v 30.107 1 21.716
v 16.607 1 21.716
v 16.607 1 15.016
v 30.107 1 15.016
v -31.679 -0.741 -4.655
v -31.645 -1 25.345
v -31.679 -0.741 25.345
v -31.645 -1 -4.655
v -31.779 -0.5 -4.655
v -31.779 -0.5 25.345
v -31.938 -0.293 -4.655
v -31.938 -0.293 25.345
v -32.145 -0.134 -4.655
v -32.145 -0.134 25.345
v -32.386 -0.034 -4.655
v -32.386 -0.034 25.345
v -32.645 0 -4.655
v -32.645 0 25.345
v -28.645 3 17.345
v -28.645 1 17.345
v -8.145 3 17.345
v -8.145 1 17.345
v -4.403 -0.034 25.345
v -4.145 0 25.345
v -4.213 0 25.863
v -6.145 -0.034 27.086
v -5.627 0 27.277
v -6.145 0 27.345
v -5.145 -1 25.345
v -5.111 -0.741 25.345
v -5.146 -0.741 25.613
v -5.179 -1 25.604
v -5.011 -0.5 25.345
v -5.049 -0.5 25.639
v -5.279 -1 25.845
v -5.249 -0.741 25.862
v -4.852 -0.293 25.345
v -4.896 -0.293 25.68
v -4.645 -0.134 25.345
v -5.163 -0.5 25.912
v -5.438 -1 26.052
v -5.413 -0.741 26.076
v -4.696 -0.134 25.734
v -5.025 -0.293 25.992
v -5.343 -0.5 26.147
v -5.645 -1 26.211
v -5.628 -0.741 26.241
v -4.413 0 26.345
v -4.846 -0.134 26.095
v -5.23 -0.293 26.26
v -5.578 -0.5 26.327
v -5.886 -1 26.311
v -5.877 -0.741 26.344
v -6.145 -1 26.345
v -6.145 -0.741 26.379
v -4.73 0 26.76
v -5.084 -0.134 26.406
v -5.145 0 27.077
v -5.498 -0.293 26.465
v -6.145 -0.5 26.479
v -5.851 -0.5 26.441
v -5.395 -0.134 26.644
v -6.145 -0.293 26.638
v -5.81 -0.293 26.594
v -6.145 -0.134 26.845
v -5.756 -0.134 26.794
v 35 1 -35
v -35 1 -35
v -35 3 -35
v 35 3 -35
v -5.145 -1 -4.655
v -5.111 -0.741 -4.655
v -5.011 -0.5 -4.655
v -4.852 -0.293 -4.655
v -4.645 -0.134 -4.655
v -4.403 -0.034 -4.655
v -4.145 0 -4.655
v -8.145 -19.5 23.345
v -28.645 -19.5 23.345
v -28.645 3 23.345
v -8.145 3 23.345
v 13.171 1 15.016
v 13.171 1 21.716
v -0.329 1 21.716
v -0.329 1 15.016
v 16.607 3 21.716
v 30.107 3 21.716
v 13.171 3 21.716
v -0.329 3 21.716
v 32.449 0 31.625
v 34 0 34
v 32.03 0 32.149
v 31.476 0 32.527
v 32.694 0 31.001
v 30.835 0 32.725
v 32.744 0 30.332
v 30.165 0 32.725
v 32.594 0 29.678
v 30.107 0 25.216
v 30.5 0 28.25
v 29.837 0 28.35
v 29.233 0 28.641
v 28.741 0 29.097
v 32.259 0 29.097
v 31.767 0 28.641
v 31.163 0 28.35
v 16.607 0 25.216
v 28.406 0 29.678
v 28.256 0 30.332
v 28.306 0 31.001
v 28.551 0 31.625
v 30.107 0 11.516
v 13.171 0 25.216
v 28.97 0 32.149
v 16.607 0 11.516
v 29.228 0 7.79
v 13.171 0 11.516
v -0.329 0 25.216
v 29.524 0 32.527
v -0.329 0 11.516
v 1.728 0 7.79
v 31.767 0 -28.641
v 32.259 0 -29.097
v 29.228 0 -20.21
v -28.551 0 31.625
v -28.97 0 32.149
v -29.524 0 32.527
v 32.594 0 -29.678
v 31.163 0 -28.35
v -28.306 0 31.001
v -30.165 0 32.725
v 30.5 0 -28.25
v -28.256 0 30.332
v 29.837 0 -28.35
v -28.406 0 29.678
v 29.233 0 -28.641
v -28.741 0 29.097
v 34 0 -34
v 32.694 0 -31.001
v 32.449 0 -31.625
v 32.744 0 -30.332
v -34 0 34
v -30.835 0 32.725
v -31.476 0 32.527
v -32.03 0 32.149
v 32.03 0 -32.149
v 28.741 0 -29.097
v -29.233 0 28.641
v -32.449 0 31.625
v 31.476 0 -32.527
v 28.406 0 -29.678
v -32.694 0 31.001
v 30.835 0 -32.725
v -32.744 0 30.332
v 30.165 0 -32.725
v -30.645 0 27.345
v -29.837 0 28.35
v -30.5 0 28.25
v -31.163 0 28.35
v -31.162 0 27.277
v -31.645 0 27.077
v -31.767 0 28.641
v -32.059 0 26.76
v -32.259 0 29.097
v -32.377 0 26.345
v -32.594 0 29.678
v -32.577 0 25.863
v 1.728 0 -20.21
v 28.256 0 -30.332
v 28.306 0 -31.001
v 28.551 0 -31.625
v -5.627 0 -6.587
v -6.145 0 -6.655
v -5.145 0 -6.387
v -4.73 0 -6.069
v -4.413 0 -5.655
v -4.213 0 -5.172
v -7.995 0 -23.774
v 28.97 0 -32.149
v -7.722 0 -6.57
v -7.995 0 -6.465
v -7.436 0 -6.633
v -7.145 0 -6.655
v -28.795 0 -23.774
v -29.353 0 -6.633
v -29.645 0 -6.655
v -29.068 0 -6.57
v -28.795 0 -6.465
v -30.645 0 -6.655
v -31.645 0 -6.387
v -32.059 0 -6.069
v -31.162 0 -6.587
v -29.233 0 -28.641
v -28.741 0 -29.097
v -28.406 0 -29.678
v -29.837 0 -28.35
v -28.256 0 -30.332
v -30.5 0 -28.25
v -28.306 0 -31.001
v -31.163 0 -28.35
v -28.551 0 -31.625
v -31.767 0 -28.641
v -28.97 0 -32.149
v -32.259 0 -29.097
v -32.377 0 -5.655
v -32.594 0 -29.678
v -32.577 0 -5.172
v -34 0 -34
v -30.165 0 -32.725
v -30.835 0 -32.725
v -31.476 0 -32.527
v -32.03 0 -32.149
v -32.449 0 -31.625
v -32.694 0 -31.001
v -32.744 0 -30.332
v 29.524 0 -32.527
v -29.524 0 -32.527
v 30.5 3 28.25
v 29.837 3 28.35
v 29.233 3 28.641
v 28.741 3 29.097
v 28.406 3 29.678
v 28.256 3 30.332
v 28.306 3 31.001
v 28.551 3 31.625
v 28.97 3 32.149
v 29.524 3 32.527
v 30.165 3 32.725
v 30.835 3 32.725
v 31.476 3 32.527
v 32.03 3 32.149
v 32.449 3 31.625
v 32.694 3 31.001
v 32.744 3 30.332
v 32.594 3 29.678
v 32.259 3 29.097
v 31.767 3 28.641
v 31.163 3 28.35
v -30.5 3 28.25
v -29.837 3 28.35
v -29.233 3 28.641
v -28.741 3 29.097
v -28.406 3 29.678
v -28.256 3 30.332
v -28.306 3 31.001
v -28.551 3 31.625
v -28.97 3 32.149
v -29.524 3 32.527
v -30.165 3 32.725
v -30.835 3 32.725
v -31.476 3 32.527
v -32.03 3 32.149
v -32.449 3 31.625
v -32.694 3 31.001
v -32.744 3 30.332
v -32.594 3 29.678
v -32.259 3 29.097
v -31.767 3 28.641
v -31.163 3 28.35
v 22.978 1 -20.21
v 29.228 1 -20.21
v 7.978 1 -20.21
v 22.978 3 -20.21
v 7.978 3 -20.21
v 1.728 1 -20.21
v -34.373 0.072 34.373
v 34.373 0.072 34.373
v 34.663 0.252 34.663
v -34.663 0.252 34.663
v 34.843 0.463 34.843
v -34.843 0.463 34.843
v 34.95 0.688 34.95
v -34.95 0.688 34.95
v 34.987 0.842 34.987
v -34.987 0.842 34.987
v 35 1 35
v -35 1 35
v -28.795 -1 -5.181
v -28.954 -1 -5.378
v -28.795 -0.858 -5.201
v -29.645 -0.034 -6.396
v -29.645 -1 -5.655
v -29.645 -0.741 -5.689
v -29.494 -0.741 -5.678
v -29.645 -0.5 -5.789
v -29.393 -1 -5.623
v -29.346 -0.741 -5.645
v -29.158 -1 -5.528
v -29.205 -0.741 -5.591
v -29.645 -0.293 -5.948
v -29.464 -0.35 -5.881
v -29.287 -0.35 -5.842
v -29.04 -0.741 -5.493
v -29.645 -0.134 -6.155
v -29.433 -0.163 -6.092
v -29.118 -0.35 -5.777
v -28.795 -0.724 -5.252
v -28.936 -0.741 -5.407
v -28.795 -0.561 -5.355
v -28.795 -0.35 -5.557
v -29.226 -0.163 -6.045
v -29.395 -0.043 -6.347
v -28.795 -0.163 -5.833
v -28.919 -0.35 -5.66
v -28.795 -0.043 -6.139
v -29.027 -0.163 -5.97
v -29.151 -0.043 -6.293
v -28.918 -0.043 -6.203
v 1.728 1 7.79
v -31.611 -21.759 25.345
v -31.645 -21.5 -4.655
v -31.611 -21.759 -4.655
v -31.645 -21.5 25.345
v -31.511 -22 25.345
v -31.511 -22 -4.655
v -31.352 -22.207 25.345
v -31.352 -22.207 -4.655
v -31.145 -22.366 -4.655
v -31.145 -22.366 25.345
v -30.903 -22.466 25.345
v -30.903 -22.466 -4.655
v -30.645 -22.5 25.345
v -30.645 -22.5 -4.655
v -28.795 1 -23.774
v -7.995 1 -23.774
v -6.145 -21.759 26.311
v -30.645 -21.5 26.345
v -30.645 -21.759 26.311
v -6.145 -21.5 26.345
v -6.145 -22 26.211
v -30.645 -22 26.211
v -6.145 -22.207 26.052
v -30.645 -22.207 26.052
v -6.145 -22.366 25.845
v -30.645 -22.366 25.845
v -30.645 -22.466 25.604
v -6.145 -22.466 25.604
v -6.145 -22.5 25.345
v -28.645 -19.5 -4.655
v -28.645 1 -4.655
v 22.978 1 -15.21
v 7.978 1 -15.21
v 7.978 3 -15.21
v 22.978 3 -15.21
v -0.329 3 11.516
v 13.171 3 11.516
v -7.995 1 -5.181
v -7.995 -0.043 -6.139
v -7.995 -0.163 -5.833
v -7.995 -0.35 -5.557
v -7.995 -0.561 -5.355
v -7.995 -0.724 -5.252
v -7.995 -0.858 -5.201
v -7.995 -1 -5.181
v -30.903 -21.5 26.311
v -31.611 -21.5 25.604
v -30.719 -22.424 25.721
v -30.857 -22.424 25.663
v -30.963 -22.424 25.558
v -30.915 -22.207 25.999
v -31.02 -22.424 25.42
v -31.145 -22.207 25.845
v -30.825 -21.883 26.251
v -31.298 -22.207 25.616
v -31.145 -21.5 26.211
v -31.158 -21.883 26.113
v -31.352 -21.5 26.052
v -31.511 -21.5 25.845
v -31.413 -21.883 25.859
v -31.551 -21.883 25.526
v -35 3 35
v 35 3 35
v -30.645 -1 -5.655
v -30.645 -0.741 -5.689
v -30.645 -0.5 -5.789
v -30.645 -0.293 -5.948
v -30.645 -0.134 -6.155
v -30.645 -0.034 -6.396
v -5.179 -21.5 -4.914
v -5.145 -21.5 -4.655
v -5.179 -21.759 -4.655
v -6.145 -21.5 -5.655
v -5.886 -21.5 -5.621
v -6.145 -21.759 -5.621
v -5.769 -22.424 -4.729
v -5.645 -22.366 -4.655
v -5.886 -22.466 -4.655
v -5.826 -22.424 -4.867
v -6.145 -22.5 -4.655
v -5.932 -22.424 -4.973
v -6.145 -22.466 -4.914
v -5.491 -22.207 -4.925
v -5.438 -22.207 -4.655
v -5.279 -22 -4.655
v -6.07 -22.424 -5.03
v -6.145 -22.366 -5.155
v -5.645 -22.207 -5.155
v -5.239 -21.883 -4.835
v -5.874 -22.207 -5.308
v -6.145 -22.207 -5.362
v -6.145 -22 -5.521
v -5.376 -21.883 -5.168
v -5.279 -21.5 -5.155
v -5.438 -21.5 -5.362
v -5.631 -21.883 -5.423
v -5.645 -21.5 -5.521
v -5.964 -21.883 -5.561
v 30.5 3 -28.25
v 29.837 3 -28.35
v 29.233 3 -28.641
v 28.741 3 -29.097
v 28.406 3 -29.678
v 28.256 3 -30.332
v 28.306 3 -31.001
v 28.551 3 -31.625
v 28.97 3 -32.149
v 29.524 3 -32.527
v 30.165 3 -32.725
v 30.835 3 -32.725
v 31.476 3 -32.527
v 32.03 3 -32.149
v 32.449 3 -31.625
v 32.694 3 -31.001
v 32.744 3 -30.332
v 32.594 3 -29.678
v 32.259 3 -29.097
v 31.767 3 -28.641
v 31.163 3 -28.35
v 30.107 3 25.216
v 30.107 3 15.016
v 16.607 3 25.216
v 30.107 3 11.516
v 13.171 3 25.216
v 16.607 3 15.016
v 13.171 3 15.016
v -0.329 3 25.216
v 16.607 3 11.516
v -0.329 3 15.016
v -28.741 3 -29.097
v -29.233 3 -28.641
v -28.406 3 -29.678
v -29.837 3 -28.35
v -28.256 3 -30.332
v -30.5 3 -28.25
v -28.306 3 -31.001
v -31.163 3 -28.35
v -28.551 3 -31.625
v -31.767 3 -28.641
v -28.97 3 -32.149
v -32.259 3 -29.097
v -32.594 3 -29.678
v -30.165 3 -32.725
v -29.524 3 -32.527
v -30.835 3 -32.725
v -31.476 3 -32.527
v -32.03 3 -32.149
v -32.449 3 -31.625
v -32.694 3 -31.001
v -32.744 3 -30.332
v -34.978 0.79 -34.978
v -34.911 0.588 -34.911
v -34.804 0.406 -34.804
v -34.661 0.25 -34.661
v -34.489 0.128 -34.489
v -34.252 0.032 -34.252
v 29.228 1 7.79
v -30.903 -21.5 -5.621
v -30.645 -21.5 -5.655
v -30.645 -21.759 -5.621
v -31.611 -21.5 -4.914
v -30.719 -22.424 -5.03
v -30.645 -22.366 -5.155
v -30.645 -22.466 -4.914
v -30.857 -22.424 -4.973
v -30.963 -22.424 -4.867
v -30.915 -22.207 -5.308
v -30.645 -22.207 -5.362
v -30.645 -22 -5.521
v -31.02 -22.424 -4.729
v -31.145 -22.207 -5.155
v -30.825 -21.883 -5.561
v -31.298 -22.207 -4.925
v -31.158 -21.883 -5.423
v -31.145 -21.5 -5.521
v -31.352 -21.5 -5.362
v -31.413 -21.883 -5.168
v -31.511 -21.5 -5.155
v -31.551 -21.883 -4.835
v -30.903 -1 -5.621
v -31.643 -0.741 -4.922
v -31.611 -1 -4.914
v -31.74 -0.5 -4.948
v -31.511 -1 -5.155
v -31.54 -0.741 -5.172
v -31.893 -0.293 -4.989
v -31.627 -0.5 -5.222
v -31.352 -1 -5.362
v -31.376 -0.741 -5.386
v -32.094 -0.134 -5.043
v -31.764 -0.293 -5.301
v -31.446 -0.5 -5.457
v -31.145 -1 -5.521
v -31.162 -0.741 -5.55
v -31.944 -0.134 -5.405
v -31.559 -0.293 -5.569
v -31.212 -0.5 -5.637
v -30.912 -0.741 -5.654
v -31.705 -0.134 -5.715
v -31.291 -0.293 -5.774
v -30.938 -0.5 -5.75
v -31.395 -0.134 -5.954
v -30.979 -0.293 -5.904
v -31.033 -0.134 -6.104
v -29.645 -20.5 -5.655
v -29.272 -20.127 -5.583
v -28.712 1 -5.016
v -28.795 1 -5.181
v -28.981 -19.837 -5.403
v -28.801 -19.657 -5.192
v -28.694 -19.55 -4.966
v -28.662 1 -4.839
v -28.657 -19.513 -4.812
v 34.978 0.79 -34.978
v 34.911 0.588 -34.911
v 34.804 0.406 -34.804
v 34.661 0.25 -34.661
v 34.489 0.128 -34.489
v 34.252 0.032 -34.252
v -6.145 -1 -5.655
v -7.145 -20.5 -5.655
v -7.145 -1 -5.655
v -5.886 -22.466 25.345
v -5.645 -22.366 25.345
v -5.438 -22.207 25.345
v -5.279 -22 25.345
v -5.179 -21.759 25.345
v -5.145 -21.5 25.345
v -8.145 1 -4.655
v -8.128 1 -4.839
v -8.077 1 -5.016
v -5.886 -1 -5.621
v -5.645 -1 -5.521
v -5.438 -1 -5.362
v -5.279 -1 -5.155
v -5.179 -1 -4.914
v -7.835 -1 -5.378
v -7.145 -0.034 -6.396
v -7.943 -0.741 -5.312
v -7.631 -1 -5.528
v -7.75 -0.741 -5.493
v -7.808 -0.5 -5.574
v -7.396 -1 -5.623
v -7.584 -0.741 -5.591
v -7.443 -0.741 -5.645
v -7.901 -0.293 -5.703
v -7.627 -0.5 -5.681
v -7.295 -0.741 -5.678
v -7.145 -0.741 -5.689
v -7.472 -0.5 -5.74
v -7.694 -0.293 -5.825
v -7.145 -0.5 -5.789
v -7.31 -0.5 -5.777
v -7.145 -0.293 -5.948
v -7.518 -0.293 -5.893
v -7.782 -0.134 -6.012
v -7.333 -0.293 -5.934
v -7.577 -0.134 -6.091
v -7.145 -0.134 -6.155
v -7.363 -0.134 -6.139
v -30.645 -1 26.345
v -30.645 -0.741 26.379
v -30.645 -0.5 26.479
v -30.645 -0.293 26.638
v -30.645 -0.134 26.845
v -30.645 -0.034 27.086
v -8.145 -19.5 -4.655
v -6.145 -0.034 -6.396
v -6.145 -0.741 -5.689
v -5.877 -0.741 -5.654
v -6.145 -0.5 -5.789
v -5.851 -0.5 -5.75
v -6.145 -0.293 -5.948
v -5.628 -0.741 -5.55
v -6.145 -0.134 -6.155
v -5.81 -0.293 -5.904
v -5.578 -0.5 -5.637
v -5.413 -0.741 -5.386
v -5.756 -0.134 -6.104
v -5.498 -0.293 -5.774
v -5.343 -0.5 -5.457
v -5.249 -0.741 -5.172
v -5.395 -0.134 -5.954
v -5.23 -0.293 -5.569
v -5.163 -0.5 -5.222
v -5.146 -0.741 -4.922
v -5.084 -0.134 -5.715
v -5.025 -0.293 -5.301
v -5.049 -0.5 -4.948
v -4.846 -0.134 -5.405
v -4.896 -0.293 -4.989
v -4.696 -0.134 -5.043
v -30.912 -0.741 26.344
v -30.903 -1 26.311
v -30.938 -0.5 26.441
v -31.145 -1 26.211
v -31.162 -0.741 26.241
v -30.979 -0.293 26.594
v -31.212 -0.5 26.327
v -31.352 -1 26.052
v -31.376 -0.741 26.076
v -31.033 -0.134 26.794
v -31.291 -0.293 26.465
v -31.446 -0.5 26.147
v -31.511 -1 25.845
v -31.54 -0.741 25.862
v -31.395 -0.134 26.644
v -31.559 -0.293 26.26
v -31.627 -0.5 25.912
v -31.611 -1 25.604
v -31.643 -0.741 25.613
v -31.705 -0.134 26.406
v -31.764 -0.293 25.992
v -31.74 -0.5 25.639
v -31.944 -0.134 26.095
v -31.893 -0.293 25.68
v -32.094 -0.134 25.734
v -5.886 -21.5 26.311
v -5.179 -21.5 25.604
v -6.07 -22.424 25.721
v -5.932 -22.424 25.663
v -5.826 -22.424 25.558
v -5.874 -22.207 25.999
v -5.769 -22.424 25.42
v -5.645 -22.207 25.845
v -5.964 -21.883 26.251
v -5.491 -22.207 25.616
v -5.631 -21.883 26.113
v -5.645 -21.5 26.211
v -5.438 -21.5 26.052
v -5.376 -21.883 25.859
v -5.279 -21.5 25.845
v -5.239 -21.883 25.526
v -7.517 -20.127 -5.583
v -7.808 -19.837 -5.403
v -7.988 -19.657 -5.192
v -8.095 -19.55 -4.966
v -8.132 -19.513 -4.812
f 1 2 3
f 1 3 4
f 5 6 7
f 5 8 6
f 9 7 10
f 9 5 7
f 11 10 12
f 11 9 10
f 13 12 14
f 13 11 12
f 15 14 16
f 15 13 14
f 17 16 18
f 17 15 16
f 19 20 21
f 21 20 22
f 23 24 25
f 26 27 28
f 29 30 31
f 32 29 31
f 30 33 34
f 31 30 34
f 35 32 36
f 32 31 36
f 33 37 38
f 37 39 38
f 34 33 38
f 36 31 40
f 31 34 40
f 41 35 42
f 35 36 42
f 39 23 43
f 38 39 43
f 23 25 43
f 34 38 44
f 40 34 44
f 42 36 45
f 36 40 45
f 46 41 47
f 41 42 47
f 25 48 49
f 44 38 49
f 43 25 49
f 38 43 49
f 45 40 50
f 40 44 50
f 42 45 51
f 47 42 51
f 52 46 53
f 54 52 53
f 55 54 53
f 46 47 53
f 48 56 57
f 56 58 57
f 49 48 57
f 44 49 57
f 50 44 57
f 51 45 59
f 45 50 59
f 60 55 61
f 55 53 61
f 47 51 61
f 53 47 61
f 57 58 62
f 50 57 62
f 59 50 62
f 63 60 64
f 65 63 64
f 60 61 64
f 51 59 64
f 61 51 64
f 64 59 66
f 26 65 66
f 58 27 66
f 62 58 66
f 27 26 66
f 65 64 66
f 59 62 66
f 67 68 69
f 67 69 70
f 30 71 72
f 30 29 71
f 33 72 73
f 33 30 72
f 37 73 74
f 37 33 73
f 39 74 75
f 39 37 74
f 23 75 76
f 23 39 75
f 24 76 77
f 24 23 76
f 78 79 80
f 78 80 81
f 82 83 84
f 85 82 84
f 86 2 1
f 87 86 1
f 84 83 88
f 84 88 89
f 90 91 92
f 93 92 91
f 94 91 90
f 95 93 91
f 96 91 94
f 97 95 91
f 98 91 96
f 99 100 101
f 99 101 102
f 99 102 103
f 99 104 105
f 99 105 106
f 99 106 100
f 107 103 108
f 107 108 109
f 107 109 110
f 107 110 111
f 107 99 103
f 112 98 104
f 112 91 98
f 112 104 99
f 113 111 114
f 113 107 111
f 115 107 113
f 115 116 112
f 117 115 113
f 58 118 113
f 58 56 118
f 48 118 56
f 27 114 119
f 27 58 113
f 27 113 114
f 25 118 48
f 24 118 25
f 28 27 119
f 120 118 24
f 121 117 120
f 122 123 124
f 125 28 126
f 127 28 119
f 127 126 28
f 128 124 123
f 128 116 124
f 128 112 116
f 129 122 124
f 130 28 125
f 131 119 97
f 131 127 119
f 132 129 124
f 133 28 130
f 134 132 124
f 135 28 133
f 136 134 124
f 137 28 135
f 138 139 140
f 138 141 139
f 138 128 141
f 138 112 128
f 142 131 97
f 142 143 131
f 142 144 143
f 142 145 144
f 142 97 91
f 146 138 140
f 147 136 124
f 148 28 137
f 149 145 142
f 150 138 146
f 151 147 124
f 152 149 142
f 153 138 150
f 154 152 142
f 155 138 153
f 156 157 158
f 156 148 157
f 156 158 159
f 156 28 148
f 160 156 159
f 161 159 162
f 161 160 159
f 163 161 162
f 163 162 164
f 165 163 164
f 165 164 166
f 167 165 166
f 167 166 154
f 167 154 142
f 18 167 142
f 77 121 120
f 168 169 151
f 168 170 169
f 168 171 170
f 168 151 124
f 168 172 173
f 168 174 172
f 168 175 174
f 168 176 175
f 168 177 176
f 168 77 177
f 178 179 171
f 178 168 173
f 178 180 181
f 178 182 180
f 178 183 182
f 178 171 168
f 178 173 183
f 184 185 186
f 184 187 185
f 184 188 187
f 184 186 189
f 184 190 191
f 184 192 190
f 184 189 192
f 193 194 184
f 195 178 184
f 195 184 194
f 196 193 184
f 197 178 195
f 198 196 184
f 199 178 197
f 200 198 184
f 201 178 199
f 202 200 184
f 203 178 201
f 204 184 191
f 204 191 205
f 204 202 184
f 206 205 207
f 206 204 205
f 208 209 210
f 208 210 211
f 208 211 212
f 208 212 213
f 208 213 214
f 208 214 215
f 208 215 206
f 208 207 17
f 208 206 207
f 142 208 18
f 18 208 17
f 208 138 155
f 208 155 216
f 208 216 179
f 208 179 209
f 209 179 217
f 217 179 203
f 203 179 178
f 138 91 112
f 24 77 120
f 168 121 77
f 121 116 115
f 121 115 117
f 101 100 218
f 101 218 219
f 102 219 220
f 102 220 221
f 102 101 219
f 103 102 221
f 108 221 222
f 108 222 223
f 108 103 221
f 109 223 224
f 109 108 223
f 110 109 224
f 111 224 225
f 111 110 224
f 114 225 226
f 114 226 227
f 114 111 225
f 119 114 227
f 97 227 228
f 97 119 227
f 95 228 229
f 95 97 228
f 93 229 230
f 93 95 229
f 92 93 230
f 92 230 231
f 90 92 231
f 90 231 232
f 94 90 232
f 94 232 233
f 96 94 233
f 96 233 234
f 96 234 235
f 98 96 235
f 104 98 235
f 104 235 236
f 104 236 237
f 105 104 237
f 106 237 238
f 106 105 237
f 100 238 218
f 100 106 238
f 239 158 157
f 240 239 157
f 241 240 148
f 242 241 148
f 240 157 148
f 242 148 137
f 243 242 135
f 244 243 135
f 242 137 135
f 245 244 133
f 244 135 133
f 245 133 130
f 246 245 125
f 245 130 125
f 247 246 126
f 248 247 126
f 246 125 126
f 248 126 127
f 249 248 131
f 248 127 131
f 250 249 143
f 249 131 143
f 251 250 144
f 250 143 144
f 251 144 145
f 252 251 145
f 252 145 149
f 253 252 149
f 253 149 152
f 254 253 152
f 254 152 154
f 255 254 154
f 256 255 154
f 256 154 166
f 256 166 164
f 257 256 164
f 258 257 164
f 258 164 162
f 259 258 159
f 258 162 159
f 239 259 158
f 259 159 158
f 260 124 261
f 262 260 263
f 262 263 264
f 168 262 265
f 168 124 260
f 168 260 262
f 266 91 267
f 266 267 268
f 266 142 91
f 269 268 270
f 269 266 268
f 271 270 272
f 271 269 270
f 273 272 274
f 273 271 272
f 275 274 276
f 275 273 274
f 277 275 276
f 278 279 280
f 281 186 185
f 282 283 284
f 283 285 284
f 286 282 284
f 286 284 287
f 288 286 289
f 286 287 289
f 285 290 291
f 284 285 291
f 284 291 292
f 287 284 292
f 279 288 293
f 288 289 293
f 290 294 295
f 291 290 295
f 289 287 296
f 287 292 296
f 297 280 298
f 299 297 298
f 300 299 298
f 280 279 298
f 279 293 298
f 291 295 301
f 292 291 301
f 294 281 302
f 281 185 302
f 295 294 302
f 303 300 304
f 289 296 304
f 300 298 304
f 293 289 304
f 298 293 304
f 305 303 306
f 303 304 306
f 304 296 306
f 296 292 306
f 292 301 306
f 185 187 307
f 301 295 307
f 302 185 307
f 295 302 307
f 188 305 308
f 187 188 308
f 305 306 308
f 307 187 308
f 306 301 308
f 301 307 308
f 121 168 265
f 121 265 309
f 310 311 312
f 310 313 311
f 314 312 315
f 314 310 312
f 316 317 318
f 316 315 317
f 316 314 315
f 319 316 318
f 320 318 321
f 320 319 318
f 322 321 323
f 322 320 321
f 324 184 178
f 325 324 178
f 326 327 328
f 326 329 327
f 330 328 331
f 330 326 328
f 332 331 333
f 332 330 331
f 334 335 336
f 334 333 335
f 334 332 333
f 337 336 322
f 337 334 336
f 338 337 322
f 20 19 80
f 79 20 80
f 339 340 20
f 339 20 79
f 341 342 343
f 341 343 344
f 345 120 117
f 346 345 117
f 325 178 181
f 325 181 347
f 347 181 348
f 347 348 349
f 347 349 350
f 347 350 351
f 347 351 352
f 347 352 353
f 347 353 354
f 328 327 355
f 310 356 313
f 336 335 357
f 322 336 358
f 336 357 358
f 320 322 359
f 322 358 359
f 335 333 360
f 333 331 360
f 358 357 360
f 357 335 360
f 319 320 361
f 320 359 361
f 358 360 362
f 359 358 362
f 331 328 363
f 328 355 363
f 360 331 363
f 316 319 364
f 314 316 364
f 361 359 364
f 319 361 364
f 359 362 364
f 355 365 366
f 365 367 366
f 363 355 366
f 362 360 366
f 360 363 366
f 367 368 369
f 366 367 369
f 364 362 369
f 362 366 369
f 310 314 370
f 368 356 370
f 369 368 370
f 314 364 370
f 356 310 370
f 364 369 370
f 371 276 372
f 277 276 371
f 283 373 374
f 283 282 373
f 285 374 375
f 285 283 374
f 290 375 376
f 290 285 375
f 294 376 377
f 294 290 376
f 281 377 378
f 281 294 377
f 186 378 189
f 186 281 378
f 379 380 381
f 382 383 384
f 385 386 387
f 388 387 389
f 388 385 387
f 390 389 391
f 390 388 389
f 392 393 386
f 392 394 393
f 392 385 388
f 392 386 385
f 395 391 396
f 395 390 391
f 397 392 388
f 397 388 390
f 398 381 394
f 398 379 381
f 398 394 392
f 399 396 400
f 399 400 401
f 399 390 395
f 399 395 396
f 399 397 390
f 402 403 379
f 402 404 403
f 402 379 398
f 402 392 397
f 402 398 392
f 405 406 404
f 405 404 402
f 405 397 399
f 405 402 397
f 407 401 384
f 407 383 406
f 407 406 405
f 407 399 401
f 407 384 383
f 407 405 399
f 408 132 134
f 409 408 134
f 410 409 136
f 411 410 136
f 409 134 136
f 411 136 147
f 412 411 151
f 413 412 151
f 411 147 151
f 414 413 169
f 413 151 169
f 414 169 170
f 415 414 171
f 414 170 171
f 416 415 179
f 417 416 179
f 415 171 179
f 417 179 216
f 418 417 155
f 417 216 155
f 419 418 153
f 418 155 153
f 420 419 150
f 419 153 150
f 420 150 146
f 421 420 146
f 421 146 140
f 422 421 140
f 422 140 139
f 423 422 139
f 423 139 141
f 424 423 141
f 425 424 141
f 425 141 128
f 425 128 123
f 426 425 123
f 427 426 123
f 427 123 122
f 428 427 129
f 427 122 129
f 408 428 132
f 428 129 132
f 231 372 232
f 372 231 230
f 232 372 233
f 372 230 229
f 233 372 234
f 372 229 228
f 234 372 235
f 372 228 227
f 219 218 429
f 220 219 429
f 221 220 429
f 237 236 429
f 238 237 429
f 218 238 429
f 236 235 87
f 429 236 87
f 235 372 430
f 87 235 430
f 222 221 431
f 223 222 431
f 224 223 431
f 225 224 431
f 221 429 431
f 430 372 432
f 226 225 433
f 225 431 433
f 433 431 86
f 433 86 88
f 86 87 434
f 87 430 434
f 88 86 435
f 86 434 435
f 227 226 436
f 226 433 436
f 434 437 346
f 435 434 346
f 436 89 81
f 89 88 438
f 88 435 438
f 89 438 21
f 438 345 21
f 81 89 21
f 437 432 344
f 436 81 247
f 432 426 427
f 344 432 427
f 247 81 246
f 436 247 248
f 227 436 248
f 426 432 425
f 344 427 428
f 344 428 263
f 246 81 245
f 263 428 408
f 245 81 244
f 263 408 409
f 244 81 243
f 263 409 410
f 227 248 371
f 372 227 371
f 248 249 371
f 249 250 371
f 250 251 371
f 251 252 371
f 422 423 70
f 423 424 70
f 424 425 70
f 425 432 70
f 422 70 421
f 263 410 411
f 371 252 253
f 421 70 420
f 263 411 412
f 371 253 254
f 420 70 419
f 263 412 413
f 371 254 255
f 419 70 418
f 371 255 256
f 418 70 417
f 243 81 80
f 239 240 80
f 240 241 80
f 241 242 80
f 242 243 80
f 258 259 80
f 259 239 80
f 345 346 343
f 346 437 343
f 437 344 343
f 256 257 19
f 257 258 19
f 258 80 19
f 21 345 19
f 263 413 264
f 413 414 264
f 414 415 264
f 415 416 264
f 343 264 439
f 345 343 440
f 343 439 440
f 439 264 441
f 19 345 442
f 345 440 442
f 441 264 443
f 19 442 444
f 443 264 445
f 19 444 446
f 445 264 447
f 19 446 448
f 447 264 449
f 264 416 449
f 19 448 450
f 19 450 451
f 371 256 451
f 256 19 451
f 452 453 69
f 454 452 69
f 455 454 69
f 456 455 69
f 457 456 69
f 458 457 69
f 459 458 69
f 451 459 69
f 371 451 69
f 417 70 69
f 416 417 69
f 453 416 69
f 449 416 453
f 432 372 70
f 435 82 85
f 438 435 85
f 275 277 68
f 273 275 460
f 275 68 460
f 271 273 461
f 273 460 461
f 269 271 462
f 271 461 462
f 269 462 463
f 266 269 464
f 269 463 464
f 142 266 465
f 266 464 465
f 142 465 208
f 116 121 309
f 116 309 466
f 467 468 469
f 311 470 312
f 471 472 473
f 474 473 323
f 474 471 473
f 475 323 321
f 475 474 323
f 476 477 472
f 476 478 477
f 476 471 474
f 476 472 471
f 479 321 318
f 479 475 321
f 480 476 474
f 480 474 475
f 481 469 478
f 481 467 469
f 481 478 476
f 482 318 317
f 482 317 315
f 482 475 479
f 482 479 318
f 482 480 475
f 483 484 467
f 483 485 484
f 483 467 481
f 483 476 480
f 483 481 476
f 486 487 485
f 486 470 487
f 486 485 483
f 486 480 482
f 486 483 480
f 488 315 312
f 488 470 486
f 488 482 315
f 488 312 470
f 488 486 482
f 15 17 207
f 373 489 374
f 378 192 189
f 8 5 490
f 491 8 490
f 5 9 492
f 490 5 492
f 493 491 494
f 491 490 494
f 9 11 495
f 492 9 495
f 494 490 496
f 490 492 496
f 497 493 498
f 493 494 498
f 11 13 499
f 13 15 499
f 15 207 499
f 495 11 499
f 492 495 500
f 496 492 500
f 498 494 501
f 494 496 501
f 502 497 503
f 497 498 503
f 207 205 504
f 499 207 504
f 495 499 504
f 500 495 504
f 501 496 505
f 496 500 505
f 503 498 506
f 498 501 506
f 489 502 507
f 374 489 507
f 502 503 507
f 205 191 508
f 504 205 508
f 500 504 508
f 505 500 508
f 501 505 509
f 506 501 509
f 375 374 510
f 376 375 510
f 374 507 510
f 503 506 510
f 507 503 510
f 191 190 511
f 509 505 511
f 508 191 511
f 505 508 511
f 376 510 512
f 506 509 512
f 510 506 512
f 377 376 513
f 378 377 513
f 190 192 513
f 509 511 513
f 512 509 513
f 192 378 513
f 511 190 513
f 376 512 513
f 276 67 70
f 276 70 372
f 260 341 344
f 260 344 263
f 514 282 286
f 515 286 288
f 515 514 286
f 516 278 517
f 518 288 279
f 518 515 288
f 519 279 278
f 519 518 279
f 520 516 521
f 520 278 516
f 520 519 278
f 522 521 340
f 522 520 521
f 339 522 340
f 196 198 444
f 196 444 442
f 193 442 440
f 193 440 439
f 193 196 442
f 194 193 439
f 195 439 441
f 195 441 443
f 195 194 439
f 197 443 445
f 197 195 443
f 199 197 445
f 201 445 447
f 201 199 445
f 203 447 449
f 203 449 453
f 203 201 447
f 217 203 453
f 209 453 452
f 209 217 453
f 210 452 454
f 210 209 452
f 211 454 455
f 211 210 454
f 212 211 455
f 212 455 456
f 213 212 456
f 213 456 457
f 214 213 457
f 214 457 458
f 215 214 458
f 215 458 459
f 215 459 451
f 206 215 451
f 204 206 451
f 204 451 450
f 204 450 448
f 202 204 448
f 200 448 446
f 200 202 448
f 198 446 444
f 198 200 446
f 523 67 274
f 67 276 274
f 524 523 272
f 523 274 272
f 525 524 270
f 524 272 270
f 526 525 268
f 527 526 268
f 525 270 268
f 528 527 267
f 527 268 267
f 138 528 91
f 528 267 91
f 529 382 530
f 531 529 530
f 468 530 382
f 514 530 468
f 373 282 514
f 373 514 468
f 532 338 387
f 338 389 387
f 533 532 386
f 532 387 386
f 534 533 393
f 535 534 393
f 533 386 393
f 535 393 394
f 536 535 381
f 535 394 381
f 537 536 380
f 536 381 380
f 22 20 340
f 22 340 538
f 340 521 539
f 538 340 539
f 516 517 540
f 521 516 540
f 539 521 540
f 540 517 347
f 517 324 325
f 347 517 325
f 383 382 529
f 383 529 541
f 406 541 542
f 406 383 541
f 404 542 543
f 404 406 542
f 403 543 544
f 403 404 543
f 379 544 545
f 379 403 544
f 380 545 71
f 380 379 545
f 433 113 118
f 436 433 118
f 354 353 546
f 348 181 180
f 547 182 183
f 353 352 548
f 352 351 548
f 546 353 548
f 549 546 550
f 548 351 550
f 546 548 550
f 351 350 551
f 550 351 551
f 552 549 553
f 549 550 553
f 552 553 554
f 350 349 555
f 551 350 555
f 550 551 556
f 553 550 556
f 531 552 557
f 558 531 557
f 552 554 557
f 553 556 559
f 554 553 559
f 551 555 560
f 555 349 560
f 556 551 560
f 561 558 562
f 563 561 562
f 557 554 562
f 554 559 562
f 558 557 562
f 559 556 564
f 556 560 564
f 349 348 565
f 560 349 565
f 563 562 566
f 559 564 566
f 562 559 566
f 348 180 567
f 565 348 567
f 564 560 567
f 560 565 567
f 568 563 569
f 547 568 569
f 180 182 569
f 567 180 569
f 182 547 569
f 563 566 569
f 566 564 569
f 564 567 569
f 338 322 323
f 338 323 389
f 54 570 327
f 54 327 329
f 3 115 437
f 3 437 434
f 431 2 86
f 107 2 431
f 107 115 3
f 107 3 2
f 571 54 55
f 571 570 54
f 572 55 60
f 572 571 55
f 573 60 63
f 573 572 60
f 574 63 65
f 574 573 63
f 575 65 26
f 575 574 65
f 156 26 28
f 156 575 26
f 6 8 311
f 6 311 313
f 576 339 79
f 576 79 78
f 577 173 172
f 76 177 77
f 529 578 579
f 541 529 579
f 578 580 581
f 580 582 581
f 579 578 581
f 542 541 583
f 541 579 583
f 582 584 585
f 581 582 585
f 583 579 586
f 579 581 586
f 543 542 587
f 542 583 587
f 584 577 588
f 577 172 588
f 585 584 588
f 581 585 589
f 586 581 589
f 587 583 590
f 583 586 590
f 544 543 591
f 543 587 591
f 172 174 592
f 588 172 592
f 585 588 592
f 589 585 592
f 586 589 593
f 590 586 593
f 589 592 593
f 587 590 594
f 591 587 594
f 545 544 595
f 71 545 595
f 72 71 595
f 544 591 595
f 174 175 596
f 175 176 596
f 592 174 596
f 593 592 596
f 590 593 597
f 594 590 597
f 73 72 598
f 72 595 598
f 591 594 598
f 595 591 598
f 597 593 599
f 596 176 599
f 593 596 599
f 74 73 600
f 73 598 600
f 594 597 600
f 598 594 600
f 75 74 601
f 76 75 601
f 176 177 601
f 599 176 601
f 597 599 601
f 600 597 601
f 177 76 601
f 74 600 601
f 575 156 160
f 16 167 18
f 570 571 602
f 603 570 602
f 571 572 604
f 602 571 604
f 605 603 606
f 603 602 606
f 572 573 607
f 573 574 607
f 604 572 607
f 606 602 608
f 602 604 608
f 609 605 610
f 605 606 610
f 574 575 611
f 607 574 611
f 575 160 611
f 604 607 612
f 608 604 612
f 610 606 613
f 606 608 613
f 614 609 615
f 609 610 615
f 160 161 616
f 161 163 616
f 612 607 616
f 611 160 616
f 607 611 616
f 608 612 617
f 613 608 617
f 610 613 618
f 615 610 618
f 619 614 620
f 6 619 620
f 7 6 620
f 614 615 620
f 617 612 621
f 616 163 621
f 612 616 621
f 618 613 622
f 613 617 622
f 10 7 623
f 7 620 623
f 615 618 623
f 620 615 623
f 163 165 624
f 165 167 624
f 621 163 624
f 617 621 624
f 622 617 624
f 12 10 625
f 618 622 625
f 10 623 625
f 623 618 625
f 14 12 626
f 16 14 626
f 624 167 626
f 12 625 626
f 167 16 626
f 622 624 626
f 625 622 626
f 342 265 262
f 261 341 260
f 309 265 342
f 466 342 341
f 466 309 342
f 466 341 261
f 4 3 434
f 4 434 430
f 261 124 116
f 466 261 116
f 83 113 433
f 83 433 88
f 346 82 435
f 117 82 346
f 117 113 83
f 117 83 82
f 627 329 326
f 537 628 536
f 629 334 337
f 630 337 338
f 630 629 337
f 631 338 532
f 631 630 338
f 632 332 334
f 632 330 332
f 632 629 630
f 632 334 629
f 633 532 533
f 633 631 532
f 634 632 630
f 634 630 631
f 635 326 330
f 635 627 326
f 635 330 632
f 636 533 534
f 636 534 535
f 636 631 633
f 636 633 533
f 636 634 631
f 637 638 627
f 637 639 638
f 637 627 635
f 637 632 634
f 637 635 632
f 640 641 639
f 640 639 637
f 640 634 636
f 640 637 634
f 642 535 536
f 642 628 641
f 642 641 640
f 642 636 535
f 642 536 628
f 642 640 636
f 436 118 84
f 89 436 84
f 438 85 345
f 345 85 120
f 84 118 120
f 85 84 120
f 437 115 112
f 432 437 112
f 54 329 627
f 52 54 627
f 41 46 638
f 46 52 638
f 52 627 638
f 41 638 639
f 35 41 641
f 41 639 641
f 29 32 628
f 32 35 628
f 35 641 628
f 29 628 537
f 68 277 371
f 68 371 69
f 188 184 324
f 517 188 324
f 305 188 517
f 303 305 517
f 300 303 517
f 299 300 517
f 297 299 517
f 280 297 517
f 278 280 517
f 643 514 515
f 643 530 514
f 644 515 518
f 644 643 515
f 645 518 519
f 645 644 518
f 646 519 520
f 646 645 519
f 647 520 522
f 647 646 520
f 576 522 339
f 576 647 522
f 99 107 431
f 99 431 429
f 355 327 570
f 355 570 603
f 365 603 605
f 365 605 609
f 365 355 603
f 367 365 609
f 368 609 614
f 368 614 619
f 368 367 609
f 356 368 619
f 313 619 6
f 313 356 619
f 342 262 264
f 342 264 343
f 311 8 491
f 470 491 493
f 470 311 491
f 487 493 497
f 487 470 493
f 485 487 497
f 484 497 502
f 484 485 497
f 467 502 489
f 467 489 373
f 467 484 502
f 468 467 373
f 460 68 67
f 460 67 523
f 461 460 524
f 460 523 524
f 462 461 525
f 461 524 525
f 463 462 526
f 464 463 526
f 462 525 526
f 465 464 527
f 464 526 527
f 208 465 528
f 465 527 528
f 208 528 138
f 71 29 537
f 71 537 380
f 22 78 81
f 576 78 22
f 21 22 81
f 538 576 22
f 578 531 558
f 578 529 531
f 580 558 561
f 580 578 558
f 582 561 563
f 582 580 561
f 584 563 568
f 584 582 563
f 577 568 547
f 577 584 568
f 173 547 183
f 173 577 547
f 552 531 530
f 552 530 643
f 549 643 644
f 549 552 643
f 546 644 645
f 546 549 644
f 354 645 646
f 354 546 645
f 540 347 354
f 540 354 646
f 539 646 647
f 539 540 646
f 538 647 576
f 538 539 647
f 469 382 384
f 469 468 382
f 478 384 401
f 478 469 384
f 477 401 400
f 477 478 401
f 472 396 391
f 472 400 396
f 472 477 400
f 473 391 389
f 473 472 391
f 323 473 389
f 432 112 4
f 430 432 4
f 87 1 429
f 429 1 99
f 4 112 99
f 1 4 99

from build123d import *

# Parameters (mm, degrees)
BOSS_EXTRUDE1_DEPTH                        = 3
SKETCH4_R                                  = 2.250000000000006
CUT_EXTRUDE2_DEPTH                         = 3
MIRROR1_AT_THE_SECOND_PLANE_COPY_1_SKETC_R = 2.250000000000006
MIRROR1_AT_THE_SECOND_PLANE_COPY_1_DEPTH   = 3
FILLET4_R                                  = 1
CUT_EXTRUDE3_DEPTH                         = 1
SKETCH6_W                                  = 27.499999999999993
SKETCH6_H                                  = 27.999999999999996
CUT_EXTRUDE4_DEPTH                         = 1
CUT_EXTRUDE5_DEPTH                         = 3
SKETCH8_W                                  = 13.499999999999996
SKETCH8_H                                  = 13.700000000000003
CUT_EXTRUDE6_DEPTH                         = 1
SKETCH9_W                                  = 13.5
SKETCH9_H                                  = 3.5000000000000036
CUT_EXTRUDE7_DEPTH                         = 3
SKETCH10_W                                 = 13.499999999999996
SKETCH10_H                                 = 3.5000000000000036
SKETCH10_H_2                               = 3.5000000000000018
CUT_EXTRUDE8_DEPTH                         = 3
BOSS_EXTRUDE2_DEPTH                        = 23.5
CUT_EXTRUDE9_DEPTH                         = 29
SKETCH13_W                                 = 20.500000000000004
SKETCH13_H                                 = 6.0000000000000036
CUT_EXTRUDE10_DEPTH                        = 3
FILLET5_R                                  = 1
FILLET6_R                                  = 1
SKETCH14_W                                 = 20.8
SKETCH14_H                                 = 3.0000000000000036
CUT_EXTRUDE11_DEPTH                        = 1


with BuildPart() as part:
    # Sketch1 → Boss-Extrude1 (new body)
    with BuildSketch(Plane(origin=(0, 0, 0), x_dir=(1, 0, 0), z_dir=(0, 1, 0))):
        Polygon((-35, 35.00000000000001), (35, 35.00000000000001), (35.000000000000014, -34.99999999999999), (-35, -34.99999999999999), align=None)
    extrude(amount=BOSS_EXTRUDE1_DEPTH)

    # Sketch4 → Cut-Extrude2 (cut)
    with BuildSketch(Plane(origin=(0, 0, 0), x_dir=(-1, 0, 0), z_dir=(0, -1, 0))):
        with Locations(Location((30.500000000000004, -30.499999999999993, 0), (0, 0, 90))):
            Circle(SKETCH4_R)
    cut_extrude2 = extrude(amount=-CUT_EXTRUDE2_DEPTH, mode=Mode.SUBTRACT)

    # Mirror1: Cut-Extrude2 across plane
    add(cut_extrude2.mirror(Plane(origin=(0, 0, 0), x_dir=(0, 0, 1), z_dir=(1, 0, 0))), mode=Mode.SUBTRACT)

    # Mirror1 at the second plane: Cut-Extrude2 across plane
    add(cut_extrude2.mirror(Plane.XY), mode=Mode.SUBTRACT)

    # Mirror1 at the second plane copy 1 sketc → Mirror1 at the second plane copy 1 (cut)
    with BuildSketch(Plane.XZ):
        with Locations(Location((30.500000000000004, -30.499999999999993, 0), (0, 0, 90))):
            Circle(MIRROR1_AT_THE_SECOND_PLANE_COPY_1_SKETC_R)
    extrude(amount=-MIRROR1_AT_THE_SECOND_PLANE_COPY_1_DEPTH, mode=Mode.SUBTRACT)

    # Fillet4
    fillet4_edges = [part.edges().sort_by_distance(p)[0] for p in [
        (7.11e-15, 0, 34.99999999999999),
        (-35, 0, -7.11e-15),
        (0, 0, -35.00000000000001),
        (35.00000000000001, 0, -7.11e-15),
    ]]
    fillet(fillet4_edges, radius=FILLET4_R)

    # Sketch5 → Cut-Extrude3 (cut)
    with BuildSketch(Plane(origin=(0, 0, 0), x_dir=(-1, 0, 0), z_dir=(0, -1, 0))):
        Polygon((28.79465847473562, -24.725896818258043), (7.994658474735617, -24.725896818258047), (7.994658474735617, 20.774103181741953), (28.79465847473562, 20.774103181741957), align=None)
    extrude(amount=-CUT_EXTRUDE3_DEPTH, mode=Mode.SUBTRACT)

    # Sketch6 → Cut-Extrude4 (cut)
    with BuildSketch(Plane.XZ):
        with Locations((15.477858409688114, -6.209961428811168)):
            Rectangle(SKETCH6_W, SKETCH6_H)
    extrude(amount=-CUT_EXTRUDE4_DEPTH, mode=Mode.SUBTRACT)

    # Sketch7 → Cut-Extrude5 (cut)
    with BuildSketch(Plane(origin=(0, 1, 0), x_dir=(-1, 0, 0), z_dir=(0, -1, 0))):
        Polygon((-7.977858409688114, 15.209961428811162), (-22.977858409688114, 15.20996142881116), (-22.977858409688114, 20.209961428811166), (-7.977858409688114, 20.209961428811166), align=None)
    extrude(amount=-CUT_EXTRUDE5_DEPTH, mode=Mode.SUBTRACT)

    # Sketch8 → Cut-Extrude6 (cut)
    with BuildSketch(Plane.XZ):
        Polygon((-0.32931613637633694, 25.216207013959828), (13.170683863623664, 25.216207013959828), (13.170683863623664, 11.516207013959828), (-0.3293161363763353, 11.516207013959828), align=None)
        with Locations((23.356942305835496, 18.36620701395983)):
            Rectangle(SKETCH8_W, SKETCH8_H)
    extrude(amount=-CUT_EXTRUDE6_DEPTH, mode=Mode.SUBTRACT)

    # Sketch9 → Cut-Extrude7 (cut)
    with BuildSketch(Plane(origin=(0, 1, 0), x_dir=(-1, 0, 0), z_dir=(0, -1, 0))):
        with Locations((-6.420683863623664, -23.46620701395983)):
            Rectangle(SKETCH9_W, SKETCH9_H)
        Polygon((0.3293161363763353, -11.516207013959828), (-13.170683863623664, -11.51620701395983), (-13.170683863623664, -15.01620701395983), (0.3293161363763357, -15.016207013959828), align=None)
    extrude(amount=-CUT_EXTRUDE7_DEPTH, mode=Mode.SUBTRACT)

    # Sketch10 → Cut-Extrude8 (cut)
    with BuildSketch(Plane.XZ.offset(-1)):
        with Locations((23.356942305835496, 23.46620701395983)):
            Rectangle(SKETCH10_W, SKETCH10_H)
        with Locations((23.356942305835496, 13.266207013959828)):
            Rectangle(SKETCH10_W, SKETCH10_H_2)
    extrude(amount=-CUT_EXTRUDE8_DEPTH, mode=Mode.SUBTRACT)

    # Sketch11 → Boss-Extrude2 (add)
    with BuildSketch(Plane(origin=(0, 1, 0), x_dir=(-1, 0, 0), z_dir=(0, -1, 0))):
        Polygon((31.644658474735618, -26.345290910107266), (5.144658474735617, -26.34529091010727), (5.144658474735617, 5.654709089892729), (31.644658474735618, 5.654709089892732), align=None)
    extrude(amount=BOSS_EXTRUDE2_DEPTH)

    # Sketch12 → Cut-Extrude9 (cut)
    with BuildSketch(Plane(origin=(5.6e-16, 0, -5.654709089892728), x_dir=(-1, 0, -1e-16), z_dir=(1e-16, 0, -1))):
        Polygon((8.144658474735618, 1), (28.644658474735618, 1), (28.64465847473562, -19.5), (8.14465847473562, -19.5), align=None)
    extrude(amount=-CUT_EXTRUDE9_DEPTH, mode=Mode.SUBTRACT)

    # Sketch13 → Cut-Extrude10 (cut)
    with BuildSketch(Plane.XZ.offset(-1)):
        with Locations((-18.39465847473562, 20.345290910107273)):
            Rectangle(SKETCH13_W, SKETCH13_H)
    extrude(amount=-CUT_EXTRUDE10_DEPTH, mode=Mode.SUBTRACT)

    # Fillet5
    fillet5_edges = [part.edges().sort_by_distance(p)[0] for p in [
        (-5.144658474735617, -11.25, 26.34529091010727),
        (-31.644658474735618, -11.25, 26.345290910107266),
        (-5.144658474735617, -11.25, -5.654709089892729),
        (-31.644658474735618, -11.25, -5.654709089892732),
        (-28.64465847473562, -9.25, -5.654709089892731),
        (-18.39465847473562, -19.5, -5.65470908989273),
        (-8.144658474735618, -9.25, -5.654709089892729),
        (-18.394658474735618, -22.5, 26.345290910107266),
        (-5.144658474735617, -22.5, 10.34529091010727),
        (-18.394658474735618, -22.5, -5.65470908989273),
        (-31.644658474735618, -22.5, 10.345290910107268),
    ]]
    fillet(fillet5_edges, radius=FILLET5_R)

    # Fillet6
    fillet6_edges = [part.edges().sort_by_distance(p)[0] for p in [
        (-18.394658474735618, 0, 26.345290910107266),
        (-5.144658474735617, 0, 10.34529091010727),
        (-31.644658474735618, 0, 10.345290910107266),
        (-6.644658474735618, 0, -5.654709089892728),
        (-30.144658474735618, 0, -5.654709089892731),
        (-5.43755169354907, 0, 26.052397691293816),
        (-31.351765255922164, 0, 26.052397691293812),
        (-5.437551693549068, 0, -5.361815871079277),
        (-31.351765255922164, 0, -5.361815871079279),
        (-29.15823411660915, -8e-17, -5.528431782639838),
        (-7.631082832861968, 4e-17, -5.528431782639901),
    ]]
    fillet(fillet6_edges, radius=FILLET6_R)

    # Sketch14 → Cut-Extrude11 (cut)
    with BuildSketch(Plane.XZ):
        with Locations((-18.394658474735618, -22.274103181741957)):
            Rectangle(SKETCH14_W, SKETCH14_H)
    extrude(amount=-CUT_EXTRUDE11_DEPTH, mode=Mode.SUBTRACT)


solid = part.part
